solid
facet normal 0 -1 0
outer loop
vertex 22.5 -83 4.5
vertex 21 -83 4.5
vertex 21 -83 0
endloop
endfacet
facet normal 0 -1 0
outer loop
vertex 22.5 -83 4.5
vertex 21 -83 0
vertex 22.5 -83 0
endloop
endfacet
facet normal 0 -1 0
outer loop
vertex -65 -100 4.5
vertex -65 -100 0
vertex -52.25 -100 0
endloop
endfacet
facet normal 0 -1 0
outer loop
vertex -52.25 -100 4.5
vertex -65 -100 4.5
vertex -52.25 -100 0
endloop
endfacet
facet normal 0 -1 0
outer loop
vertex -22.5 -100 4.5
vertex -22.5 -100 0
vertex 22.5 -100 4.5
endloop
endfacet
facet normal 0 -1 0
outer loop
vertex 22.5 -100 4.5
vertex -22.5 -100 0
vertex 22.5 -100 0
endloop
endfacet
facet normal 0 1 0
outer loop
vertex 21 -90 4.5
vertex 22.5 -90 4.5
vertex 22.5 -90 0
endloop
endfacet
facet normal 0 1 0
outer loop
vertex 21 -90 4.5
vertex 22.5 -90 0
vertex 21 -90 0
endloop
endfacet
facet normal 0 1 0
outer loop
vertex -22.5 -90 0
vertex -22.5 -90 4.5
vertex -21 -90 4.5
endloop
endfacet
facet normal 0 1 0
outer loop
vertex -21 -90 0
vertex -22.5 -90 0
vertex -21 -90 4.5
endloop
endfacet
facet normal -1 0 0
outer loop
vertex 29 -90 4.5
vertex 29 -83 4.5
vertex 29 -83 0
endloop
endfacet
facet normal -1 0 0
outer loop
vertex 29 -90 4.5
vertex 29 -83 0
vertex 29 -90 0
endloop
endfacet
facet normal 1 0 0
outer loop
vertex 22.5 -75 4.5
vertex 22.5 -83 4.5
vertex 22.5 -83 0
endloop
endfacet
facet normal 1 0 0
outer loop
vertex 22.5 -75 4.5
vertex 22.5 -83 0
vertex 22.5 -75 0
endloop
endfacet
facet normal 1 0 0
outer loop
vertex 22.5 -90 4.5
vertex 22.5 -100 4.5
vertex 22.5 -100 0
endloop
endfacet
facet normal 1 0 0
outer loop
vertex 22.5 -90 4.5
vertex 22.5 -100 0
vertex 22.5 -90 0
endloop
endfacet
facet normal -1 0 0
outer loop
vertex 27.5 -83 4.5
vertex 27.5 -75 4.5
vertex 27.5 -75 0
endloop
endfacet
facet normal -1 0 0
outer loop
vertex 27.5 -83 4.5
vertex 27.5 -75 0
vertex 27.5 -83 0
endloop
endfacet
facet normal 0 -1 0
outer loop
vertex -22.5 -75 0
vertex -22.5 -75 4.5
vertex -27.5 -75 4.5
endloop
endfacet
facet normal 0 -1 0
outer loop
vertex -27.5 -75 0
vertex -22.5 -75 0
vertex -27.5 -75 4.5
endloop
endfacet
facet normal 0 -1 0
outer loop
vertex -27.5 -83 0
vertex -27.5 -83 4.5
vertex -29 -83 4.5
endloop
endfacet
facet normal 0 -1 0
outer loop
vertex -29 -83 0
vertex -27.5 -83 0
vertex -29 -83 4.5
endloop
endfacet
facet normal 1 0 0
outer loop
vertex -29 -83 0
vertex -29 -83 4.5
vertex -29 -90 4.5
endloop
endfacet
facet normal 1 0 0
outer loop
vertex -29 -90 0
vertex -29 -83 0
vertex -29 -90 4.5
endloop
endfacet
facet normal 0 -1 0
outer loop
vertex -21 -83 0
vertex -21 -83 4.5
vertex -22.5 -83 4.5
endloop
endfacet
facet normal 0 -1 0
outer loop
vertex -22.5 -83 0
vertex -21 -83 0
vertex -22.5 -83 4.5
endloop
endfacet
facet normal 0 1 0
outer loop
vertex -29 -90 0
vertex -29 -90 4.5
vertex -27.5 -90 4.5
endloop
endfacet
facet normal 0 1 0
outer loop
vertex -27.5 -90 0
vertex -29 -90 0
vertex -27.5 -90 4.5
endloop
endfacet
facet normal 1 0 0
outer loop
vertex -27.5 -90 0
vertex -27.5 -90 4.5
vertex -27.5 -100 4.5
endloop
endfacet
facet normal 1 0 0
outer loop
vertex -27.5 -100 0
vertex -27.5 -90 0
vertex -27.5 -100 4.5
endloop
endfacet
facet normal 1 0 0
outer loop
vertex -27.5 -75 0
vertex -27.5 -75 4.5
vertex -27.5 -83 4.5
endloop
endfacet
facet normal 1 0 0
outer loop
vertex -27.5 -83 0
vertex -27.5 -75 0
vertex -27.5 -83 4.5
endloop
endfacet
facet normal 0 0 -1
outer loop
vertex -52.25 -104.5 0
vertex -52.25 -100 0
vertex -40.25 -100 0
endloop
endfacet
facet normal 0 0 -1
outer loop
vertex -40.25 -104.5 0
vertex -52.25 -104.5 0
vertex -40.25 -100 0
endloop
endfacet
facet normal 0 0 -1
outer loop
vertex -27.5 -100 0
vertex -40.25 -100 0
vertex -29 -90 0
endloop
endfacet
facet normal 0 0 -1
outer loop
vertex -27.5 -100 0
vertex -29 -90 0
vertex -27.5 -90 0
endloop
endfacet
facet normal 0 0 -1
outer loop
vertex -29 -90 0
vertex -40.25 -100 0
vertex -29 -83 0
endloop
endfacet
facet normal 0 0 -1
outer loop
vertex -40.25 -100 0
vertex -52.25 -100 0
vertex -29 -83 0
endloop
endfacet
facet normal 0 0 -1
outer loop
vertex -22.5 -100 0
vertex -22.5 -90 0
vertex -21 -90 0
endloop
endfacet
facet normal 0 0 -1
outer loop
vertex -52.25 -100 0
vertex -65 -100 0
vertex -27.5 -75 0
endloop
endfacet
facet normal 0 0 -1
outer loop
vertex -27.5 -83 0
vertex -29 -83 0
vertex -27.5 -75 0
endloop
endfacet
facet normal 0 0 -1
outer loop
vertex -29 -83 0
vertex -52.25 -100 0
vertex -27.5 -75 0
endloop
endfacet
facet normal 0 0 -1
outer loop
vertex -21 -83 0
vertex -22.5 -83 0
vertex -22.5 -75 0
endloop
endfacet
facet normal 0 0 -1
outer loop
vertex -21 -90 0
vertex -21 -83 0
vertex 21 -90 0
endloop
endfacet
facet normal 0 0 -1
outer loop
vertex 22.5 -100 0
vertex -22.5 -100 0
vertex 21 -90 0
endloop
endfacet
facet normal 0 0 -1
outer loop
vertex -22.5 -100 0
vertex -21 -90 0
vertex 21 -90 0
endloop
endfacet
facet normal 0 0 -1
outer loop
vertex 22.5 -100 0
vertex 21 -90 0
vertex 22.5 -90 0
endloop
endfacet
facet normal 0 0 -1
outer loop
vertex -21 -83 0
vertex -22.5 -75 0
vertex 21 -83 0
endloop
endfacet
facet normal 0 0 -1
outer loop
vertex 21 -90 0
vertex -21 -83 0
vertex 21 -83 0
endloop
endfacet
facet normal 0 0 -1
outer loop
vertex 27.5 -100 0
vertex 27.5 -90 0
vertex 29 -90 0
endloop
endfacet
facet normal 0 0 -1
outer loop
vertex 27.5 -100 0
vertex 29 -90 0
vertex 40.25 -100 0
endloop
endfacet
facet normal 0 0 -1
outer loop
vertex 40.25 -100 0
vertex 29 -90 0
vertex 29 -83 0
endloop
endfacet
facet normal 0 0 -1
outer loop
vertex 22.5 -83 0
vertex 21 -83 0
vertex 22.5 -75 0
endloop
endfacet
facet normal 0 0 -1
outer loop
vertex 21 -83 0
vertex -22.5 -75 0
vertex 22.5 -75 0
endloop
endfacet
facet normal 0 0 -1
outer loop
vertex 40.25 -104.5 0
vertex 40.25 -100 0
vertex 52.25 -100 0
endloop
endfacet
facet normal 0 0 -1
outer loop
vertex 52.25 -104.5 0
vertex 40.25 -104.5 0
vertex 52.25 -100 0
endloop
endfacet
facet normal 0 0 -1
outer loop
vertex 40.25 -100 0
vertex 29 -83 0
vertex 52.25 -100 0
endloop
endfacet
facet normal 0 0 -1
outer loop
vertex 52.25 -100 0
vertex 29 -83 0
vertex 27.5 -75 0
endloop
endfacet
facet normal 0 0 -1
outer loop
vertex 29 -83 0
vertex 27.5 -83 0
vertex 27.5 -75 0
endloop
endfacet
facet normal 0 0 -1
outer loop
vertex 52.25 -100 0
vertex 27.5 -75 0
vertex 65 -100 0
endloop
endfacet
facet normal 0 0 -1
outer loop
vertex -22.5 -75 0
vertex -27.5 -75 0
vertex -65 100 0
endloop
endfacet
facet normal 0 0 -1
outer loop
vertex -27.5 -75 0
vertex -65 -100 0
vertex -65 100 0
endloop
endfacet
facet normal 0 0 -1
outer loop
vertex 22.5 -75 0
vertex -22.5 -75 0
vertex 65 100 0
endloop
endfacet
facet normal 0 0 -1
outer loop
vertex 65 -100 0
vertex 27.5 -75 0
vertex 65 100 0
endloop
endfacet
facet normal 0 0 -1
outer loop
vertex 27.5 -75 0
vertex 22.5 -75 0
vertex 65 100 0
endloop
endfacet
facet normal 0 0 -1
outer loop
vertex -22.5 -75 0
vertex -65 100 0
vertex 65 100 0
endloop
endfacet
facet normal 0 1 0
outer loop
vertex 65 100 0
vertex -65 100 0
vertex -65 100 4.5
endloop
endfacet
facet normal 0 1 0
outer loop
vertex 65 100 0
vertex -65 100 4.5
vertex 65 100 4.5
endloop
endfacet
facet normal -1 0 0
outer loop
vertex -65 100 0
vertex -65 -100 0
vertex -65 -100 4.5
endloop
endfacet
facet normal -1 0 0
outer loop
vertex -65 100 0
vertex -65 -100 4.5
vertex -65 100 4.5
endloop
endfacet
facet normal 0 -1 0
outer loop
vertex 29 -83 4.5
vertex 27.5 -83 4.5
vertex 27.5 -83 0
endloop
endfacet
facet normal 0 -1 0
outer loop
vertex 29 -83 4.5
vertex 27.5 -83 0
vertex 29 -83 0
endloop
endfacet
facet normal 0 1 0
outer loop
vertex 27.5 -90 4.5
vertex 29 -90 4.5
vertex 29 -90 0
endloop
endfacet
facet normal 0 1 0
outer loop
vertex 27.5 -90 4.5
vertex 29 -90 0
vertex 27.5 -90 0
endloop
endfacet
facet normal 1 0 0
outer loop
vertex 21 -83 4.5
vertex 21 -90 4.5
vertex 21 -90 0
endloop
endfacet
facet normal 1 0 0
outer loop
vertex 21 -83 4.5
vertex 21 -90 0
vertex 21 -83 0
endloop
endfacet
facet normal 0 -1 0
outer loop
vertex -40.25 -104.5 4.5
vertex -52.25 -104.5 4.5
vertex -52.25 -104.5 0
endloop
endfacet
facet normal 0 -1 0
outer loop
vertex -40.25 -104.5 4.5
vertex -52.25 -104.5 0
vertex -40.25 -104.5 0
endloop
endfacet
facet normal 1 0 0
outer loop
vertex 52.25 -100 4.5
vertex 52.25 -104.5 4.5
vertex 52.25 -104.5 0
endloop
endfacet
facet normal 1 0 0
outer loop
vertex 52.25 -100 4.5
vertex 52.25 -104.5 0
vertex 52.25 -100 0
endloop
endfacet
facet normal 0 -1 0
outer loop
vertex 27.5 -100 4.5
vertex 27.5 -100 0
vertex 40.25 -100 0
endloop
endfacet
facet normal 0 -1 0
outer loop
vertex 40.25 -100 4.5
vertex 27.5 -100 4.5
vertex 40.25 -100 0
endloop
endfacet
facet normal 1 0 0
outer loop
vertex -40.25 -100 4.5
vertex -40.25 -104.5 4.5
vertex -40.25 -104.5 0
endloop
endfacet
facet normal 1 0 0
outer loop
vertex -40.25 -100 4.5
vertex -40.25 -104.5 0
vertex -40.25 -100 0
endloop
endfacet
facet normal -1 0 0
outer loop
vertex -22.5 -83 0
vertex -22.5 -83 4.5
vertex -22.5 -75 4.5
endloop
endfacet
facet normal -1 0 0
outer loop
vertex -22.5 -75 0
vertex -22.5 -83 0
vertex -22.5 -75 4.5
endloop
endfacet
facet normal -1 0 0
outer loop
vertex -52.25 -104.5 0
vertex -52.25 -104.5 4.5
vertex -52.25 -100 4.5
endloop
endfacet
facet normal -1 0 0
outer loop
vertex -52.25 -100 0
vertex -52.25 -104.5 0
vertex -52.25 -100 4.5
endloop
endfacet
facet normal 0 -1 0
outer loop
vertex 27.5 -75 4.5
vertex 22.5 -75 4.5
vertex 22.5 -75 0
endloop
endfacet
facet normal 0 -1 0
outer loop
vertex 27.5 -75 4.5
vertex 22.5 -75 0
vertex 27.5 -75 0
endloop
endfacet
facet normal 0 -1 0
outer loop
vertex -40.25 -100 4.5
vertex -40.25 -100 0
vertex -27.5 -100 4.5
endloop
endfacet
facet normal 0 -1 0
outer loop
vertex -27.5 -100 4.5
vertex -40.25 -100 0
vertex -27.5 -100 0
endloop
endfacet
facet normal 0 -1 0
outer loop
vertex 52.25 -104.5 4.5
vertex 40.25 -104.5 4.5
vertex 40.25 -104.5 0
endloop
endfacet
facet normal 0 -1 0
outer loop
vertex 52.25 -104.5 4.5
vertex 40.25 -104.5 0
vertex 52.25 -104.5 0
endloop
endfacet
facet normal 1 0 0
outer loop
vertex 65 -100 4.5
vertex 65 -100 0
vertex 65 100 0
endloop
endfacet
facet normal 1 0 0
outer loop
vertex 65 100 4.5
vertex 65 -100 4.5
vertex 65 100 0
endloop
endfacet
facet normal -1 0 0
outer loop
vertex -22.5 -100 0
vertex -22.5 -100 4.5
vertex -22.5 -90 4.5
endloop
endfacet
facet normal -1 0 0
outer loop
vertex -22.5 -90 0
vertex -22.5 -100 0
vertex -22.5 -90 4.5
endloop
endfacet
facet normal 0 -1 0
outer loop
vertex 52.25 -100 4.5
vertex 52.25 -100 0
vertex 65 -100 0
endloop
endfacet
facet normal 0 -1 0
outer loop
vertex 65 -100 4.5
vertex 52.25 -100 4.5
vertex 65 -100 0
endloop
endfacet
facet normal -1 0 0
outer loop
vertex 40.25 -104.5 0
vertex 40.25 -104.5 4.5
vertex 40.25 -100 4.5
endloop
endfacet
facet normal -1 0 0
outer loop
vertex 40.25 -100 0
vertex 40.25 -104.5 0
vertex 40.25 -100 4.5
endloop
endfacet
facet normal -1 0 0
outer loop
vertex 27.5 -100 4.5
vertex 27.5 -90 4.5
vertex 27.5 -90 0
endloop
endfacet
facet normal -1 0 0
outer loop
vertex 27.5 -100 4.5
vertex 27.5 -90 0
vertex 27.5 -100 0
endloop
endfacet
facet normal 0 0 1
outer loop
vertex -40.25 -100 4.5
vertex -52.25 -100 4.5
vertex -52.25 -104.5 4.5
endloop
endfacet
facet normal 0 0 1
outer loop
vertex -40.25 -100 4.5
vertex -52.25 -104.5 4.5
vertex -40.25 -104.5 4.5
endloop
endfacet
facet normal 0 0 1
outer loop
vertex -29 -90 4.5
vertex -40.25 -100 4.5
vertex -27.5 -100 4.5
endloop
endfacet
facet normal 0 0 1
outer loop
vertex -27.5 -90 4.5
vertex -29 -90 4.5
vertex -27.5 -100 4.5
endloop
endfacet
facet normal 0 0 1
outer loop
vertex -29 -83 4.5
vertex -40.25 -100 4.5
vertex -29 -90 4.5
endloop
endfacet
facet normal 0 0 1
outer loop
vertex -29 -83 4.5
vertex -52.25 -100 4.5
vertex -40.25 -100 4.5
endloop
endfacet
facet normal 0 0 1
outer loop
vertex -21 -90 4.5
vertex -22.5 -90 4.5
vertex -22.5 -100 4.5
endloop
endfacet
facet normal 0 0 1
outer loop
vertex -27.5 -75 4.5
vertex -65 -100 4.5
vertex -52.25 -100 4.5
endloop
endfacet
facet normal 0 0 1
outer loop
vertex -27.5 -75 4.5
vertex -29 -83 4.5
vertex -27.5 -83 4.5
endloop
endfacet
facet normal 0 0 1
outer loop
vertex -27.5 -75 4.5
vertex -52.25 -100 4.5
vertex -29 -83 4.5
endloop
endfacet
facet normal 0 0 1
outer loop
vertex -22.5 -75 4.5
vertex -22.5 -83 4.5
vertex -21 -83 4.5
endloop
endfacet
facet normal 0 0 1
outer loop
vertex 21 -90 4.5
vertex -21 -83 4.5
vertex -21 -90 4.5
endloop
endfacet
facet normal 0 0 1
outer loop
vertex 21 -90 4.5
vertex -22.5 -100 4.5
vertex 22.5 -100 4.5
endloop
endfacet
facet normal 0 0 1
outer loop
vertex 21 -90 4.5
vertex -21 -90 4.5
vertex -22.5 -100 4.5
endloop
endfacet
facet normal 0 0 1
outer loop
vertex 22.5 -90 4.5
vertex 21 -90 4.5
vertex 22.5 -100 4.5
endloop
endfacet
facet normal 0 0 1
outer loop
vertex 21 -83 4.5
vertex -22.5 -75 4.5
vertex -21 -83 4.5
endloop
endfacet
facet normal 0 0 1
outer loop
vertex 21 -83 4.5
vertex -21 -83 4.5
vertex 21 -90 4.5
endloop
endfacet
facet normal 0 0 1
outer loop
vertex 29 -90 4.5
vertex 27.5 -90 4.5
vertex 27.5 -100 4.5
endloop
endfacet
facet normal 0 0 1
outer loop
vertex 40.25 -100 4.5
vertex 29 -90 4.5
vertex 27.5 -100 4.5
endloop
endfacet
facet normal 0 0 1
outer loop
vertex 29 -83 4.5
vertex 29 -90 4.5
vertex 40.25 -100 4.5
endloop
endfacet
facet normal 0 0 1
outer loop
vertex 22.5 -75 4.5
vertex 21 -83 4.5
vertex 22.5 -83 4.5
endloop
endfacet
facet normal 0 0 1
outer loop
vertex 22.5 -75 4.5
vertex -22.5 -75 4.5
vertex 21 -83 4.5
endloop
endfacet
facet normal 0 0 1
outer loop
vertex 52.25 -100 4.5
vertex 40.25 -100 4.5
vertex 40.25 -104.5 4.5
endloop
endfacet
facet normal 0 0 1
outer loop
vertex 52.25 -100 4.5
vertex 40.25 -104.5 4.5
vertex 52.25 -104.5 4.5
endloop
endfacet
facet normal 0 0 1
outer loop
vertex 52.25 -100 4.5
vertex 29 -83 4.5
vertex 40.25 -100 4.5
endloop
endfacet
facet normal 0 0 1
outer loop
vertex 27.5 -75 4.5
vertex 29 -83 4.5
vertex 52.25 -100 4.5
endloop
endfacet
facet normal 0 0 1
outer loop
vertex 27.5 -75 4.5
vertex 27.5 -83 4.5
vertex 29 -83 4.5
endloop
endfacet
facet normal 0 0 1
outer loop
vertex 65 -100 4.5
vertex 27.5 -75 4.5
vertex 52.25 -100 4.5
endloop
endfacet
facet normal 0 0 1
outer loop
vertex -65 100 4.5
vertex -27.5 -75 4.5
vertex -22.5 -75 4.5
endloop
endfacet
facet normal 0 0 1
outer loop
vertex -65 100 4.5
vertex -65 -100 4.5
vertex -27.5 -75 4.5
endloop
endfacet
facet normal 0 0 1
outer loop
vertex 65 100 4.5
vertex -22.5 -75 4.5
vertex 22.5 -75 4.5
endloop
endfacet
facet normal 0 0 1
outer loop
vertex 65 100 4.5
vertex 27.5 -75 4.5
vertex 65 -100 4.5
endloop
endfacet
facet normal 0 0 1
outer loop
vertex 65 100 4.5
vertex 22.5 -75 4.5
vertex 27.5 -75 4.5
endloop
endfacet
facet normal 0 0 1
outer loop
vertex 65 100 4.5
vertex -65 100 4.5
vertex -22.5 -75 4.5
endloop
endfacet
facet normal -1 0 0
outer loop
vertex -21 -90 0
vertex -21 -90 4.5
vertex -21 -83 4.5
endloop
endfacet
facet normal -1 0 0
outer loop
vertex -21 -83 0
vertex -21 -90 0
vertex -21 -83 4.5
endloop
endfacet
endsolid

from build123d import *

# Parameters (mm, degrees)
SKETCH1_W           = 130
SKETCH1_H           = 200
BOSS_EXTRUDE1_DEPTH = 4.5
CUT_EXTRUDE1_DEPTH  = 120.353466644
SKETCH3_W           = 12
SKETCH3_H           = 4.5
BOSS_EXTRUDE2_DEPTH = 4.5


with BuildPart() as part:
    # Sketch1 → Boss-Extrude1 (new body)
    with BuildSketch(Plane.XY):
        Rectangle(SKETCH1_W, SKETCH1_H)
    extrude(amount=BOSS_EXTRUDE1_DEPTH)

    # Sketch2 → Cut-Extrude1 (cut, through all)
    with BuildSketch(Plane.XY.offset(4.5)):
        Polygon((-27.5, -90), (-27.5, -100), (-22.5, -100), (-22.5, -90), (-21, -90), (-21, -83), (-22.5, -83), (-22.5, -75), (-27.5, -75), (-27.5, -83), (-29, -83), (-29, -90), align=None)
    cut_extrude1 = extrude(amount=-CUT_EXTRUDE1_DEPTH, mode=Mode.SUBTRACT)

    # Mirror1: Cut-Extrude1 across plane
    add(cut_extrude1.mirror(Plane(origin=(0, 0, 0), x_dir=(0, 0, 1), z_dir=(1, 0, 0))), mode=Mode.SUBTRACT)

    # Sketch3 → Boss-Extrude2 (add)
    with BuildSketch(Plane.XY.offset(4.5)):
        with Locations((-46.25, -102.25)):
            Rectangle(SKETCH3_W, SKETCH3_H)
        with Locations((46.25, -102.25)):
            Rectangle(SKETCH3_W, SKETCH3_H)
    extrude(amount=-BOSS_EXTRUDE2_DEPTH)


solid = part.part
